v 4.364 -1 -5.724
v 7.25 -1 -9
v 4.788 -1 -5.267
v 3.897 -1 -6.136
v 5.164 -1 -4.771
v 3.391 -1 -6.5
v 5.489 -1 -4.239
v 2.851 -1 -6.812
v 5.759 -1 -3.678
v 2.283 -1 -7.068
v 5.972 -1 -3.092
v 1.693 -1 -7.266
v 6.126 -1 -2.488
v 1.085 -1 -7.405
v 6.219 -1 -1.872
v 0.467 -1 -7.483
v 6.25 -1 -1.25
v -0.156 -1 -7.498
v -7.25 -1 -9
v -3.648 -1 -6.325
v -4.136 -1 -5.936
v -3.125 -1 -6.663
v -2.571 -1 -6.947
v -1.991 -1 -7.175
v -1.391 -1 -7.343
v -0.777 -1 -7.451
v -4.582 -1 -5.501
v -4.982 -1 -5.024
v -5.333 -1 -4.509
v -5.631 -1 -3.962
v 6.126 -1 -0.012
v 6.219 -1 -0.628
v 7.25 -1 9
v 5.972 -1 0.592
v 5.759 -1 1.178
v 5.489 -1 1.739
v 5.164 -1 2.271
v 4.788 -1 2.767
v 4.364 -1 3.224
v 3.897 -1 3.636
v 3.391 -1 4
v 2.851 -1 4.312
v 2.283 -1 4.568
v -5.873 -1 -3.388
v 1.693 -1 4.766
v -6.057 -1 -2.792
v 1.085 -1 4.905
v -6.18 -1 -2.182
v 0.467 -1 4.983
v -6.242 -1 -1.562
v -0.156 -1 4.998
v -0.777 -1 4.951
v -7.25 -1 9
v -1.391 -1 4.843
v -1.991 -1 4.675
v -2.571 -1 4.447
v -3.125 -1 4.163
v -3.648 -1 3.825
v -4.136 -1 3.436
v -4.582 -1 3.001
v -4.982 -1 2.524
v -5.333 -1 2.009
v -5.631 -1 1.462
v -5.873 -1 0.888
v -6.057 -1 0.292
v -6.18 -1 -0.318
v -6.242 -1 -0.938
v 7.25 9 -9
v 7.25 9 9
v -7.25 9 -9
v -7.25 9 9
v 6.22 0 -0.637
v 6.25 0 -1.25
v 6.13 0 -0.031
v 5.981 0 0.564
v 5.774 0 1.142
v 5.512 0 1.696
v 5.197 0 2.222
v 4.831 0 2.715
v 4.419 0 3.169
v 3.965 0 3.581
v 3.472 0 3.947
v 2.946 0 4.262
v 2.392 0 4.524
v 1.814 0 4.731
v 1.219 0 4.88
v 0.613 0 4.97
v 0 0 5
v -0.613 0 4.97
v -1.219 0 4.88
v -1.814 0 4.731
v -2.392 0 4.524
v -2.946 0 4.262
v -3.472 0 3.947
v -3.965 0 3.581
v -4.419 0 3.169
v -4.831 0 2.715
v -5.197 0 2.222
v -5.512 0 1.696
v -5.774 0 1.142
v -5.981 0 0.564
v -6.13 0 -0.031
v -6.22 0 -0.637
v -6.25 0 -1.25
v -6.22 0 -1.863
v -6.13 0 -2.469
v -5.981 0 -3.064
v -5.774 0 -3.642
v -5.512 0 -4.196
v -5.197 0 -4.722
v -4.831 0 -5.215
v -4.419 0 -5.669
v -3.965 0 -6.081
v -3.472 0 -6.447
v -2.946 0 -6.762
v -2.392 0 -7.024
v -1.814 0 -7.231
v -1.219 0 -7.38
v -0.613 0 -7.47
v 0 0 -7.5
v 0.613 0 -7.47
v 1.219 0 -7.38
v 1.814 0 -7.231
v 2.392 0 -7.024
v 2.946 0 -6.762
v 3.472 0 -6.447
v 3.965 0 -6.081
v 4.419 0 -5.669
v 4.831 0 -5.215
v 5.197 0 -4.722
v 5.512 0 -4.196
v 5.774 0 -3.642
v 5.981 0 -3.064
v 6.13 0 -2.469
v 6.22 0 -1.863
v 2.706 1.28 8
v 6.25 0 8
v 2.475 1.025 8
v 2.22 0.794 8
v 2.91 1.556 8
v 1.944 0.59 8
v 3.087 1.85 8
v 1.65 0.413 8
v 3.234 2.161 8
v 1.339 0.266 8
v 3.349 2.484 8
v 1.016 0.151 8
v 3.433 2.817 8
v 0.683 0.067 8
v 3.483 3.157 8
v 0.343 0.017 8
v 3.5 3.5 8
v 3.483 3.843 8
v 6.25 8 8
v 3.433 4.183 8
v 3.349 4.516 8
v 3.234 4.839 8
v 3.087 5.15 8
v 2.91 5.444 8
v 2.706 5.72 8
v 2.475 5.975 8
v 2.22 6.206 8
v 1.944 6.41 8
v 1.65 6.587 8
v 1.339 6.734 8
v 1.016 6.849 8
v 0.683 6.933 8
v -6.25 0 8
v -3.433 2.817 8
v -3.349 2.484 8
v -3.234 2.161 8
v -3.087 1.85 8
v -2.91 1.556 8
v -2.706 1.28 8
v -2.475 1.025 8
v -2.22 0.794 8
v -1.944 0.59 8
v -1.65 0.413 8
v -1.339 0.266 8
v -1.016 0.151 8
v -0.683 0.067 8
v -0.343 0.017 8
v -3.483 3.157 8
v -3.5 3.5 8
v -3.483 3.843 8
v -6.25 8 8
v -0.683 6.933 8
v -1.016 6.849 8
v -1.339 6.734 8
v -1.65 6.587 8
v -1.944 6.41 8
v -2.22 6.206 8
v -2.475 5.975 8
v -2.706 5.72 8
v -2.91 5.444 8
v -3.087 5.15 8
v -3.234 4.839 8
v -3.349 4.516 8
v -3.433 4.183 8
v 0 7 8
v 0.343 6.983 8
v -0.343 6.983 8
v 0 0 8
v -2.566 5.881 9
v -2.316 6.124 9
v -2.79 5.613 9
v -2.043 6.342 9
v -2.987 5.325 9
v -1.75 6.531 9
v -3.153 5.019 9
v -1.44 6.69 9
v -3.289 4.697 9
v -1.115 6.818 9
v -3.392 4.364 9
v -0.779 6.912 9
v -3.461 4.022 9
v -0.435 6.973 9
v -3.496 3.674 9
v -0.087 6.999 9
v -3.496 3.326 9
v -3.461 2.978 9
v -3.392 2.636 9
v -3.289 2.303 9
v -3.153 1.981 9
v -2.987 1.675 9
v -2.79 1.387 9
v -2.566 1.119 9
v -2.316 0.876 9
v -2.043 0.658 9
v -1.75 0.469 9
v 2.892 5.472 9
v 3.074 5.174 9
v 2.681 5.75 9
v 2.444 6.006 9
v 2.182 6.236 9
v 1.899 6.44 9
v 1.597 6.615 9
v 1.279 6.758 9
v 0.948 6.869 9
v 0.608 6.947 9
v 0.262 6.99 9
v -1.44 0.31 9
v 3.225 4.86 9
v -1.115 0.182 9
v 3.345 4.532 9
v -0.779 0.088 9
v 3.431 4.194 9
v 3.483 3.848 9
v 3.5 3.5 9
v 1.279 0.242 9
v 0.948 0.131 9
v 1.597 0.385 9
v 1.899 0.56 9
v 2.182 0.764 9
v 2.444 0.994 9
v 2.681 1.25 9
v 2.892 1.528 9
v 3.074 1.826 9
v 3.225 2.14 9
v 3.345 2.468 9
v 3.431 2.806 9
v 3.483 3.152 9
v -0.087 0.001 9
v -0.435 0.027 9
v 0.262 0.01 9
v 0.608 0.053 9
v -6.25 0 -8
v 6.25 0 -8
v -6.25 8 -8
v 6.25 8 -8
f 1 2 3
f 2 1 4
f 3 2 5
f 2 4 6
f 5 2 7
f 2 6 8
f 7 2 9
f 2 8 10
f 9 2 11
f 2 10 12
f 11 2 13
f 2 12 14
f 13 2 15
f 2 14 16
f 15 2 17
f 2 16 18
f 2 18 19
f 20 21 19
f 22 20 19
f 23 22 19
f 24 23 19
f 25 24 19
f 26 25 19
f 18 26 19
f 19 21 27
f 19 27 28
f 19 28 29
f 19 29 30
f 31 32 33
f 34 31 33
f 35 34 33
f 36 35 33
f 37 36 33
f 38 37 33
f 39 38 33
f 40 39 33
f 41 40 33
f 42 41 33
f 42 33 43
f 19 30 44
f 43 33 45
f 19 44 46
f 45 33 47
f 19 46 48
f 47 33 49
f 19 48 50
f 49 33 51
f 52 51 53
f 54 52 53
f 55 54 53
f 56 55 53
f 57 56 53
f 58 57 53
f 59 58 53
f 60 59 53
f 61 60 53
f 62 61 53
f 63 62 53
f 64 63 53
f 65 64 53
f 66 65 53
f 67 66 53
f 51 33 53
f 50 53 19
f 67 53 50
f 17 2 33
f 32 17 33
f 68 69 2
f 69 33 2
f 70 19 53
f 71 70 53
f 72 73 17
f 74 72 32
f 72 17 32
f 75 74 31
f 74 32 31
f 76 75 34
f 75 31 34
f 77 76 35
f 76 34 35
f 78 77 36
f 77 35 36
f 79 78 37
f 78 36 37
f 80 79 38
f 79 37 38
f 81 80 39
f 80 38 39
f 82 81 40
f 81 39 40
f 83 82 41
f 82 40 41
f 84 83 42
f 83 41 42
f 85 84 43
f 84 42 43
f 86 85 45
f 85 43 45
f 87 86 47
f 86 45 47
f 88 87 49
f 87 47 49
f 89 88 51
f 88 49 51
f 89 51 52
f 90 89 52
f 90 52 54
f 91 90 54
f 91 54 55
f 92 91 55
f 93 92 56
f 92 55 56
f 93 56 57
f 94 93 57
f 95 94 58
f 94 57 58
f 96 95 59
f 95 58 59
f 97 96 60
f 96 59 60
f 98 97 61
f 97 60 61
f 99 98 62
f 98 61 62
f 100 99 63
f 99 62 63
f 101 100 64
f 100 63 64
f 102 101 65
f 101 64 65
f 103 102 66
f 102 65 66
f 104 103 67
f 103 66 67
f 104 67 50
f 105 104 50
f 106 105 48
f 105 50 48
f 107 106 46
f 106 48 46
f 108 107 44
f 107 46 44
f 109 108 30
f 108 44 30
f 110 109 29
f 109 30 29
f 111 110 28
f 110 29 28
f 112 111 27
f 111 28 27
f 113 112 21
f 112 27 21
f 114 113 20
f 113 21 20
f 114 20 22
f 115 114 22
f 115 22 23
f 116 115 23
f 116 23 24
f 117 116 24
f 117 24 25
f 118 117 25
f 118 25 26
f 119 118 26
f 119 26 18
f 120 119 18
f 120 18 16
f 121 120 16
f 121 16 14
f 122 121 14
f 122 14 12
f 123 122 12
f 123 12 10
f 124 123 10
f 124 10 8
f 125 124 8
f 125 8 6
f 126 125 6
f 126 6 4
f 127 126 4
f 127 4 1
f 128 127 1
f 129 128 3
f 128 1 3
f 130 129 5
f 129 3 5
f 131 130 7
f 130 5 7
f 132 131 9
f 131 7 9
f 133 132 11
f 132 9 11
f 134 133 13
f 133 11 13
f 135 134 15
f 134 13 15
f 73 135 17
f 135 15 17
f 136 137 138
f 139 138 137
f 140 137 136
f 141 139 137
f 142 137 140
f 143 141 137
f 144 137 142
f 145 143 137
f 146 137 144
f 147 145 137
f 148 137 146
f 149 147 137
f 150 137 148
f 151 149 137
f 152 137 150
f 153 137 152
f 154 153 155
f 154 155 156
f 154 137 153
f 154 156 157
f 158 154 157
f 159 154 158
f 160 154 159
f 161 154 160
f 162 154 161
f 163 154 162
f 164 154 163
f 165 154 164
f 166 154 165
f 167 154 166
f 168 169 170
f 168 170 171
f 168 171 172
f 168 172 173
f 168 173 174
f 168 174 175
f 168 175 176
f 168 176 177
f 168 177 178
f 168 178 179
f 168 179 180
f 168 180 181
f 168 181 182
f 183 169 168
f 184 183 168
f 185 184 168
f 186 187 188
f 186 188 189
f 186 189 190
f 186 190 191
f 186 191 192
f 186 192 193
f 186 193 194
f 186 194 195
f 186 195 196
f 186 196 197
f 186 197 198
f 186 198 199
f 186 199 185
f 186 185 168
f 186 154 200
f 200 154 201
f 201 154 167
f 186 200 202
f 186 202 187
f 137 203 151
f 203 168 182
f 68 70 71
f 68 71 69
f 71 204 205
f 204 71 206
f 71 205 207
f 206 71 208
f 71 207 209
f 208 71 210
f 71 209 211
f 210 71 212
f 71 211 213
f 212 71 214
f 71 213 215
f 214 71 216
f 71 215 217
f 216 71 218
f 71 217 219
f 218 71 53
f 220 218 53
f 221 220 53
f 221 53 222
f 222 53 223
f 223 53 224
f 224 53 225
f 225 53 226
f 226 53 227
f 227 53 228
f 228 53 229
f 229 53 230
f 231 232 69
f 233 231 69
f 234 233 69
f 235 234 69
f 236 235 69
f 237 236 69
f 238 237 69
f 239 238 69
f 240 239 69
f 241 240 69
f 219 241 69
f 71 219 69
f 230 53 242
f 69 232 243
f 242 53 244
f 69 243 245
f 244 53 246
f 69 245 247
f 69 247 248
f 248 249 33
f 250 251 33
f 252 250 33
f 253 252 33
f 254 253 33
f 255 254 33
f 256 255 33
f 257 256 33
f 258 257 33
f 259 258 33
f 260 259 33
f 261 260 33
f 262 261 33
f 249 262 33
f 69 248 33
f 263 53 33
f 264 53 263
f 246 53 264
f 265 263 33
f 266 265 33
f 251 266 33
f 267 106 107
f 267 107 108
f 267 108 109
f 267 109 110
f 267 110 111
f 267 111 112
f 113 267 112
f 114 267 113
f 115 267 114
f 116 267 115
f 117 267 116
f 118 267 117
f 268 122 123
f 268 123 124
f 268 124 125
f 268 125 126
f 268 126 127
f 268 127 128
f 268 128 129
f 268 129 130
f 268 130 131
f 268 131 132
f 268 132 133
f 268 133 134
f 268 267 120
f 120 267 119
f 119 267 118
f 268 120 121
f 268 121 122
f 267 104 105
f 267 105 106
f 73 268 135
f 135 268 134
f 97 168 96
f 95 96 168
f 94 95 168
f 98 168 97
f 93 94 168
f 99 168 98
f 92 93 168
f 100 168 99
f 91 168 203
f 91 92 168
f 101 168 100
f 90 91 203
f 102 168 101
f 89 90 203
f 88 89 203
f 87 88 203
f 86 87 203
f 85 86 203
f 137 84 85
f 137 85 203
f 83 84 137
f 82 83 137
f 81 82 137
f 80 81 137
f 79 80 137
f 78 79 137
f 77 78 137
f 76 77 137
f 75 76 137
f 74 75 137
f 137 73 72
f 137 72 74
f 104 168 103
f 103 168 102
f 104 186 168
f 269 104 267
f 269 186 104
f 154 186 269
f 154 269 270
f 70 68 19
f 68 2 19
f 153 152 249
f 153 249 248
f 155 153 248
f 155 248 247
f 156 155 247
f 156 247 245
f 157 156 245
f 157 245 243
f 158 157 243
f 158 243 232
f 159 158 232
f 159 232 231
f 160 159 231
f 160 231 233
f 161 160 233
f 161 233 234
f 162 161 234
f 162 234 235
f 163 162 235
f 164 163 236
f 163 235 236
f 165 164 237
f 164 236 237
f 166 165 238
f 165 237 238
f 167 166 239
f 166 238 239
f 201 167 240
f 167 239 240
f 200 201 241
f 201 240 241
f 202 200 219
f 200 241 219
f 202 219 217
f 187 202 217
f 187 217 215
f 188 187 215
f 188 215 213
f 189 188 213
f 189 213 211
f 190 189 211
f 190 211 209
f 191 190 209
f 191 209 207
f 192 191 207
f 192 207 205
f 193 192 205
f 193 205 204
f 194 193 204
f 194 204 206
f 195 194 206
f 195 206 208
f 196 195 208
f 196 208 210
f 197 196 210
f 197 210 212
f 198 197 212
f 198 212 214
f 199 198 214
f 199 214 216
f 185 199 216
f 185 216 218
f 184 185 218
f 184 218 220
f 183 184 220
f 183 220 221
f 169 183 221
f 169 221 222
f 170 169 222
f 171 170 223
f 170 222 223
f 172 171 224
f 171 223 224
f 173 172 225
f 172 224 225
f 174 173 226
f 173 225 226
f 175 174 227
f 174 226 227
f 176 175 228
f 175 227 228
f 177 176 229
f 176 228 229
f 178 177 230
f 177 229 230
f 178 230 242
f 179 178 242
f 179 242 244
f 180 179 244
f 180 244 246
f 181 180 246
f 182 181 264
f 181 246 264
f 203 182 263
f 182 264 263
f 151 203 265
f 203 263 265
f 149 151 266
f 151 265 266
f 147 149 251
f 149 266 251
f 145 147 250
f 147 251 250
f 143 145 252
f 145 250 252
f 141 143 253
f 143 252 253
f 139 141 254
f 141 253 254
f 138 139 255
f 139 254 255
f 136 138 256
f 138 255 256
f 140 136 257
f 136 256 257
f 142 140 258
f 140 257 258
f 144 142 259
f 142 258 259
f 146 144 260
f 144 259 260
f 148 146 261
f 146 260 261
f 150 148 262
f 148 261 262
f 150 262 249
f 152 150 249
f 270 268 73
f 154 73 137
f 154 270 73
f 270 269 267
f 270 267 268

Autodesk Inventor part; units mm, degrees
ref_plane "YZ Plane" through (0, 0, 0) normal (1, 0, 0) x (0, 1, 0)
ref_plane "XZ Plane" through (0, 0, 0) normal (0, 1, 0) x (-1, 0, 0)
ref_plane "XY Plane" through (0, 0, 0) normal (0, 0, 1) x (1, 0, 0)
sketch "Sketch1" plane through (0, 0, 0) normal (0, 1, 0) x (-1, 0, 0)
  line L0 (-7.25, -9) -> (7.25, -9)
  line L1 (7.25, -9) -> (7.25, 9)
  line L2 (7.25, 9) -> (-7.25, 9)
  line L3 (-7.25, 9) -> (-7.25, -9)
  line L4 (-7.25, -9) -> (7.25, 9) construction
  line L5 (7.25, -9) -> (-7.25, 9) construction
  point P0 (0, 0)
  dimension "d0" = 14.5
  dimension "d1" = 18
extrude "Extrusion1" add sketch "Sketch1" along normal blind 8 and the other way blind 1
sketch "Sketch2" plane through (0, -1, 0) normal (0, -1, 0) x (1, 0, 0)
  line L0 (-7.25, 9) -> (-7.25, -9) projected
  line L1 (-7.25, -9) -> (7.25, -9) projected
  circle A0 centre (0, -1.25) radius 6.25
  point P0 (0, 0)
  dimension "d7" = 1.5
  dimension "d8" = 1
  dimension "d9" = 12.5
extrude "Extrusion2" cut sketch "Sketch2" against normal blind 8
sketch "Sketch3" plane through (-7.25, 8, 9) normal (0, 0, 1) x (1, 0, 0)
  line L0 (0, 0) -> (14.5, 0) projected
  circle A0 centre (7.25, -4.5) radius 3.5
  point P0 (7.25, -8)
  dimension "d14" = 1
extrude "Extrusion3" cut sketch "Sketch3" against normal blind 8
sketch "Sketch4" plane through (0, 8, 0) normal (0, 1, 0) x (1, 0, 0)
  line L0 (-7.25, 9) -> (-7.25, -9) projected
  line L1 (-7.25, -9) -> (7.25, -9) projected
  line L2 (7.25, -9) -> (7.25, 9) projected
  line L3 (7.25, 9) -> (-7.25, 9) projected
  line L4 (6.25, -8) -> (-6.25, -8)
  line L5 (-6.25, -8) -> (-6.25, 8)
  line L6 (-6.25, 8) -> (6.25, 8)
  line L7 (6.25, 8) -> (6.25, -8)
  point P0 (0, 0)
  dimension "d17" = 1
  dimension "d18" = 1
  dimension "d19" = 1
  dimension "d20" = 1
extrude "Extrusion4" cut sketch "Sketch4" against normal blind 8 contours L4 L5 L6 L7
sketch "Sketch5" plane through (0, 8, 0) normal (0, 1, 0) x (1, 0, 0)
  line L0 (-7.25, 9) -> (-7.25, -9) projected
  line L1 (-7.25, -9) -> (7.25, -9) projected
  line L2 (7.25, -9) -> (7.25, 9) projected
  line L3 (7.25, 9) -> (-7.25, 9) projected
  line L4 (7.25, -9) -> (-7.25, -9) projected
  line L5 (7.25, 9) -> (-7.25, 9)
  line L6 (-7.25, 9) -> (-7.25, -9)
  line L7 (-7.25, -9) -> (7.25, -9)
  line L8 (7.25, -9) -> (7.25, 9)
  point P0 (0, 0)
extrude "Extrusion5" add sketch "Sketch5" along normal blind 1
properties part number "carcasaXeotype_BUZZER"
